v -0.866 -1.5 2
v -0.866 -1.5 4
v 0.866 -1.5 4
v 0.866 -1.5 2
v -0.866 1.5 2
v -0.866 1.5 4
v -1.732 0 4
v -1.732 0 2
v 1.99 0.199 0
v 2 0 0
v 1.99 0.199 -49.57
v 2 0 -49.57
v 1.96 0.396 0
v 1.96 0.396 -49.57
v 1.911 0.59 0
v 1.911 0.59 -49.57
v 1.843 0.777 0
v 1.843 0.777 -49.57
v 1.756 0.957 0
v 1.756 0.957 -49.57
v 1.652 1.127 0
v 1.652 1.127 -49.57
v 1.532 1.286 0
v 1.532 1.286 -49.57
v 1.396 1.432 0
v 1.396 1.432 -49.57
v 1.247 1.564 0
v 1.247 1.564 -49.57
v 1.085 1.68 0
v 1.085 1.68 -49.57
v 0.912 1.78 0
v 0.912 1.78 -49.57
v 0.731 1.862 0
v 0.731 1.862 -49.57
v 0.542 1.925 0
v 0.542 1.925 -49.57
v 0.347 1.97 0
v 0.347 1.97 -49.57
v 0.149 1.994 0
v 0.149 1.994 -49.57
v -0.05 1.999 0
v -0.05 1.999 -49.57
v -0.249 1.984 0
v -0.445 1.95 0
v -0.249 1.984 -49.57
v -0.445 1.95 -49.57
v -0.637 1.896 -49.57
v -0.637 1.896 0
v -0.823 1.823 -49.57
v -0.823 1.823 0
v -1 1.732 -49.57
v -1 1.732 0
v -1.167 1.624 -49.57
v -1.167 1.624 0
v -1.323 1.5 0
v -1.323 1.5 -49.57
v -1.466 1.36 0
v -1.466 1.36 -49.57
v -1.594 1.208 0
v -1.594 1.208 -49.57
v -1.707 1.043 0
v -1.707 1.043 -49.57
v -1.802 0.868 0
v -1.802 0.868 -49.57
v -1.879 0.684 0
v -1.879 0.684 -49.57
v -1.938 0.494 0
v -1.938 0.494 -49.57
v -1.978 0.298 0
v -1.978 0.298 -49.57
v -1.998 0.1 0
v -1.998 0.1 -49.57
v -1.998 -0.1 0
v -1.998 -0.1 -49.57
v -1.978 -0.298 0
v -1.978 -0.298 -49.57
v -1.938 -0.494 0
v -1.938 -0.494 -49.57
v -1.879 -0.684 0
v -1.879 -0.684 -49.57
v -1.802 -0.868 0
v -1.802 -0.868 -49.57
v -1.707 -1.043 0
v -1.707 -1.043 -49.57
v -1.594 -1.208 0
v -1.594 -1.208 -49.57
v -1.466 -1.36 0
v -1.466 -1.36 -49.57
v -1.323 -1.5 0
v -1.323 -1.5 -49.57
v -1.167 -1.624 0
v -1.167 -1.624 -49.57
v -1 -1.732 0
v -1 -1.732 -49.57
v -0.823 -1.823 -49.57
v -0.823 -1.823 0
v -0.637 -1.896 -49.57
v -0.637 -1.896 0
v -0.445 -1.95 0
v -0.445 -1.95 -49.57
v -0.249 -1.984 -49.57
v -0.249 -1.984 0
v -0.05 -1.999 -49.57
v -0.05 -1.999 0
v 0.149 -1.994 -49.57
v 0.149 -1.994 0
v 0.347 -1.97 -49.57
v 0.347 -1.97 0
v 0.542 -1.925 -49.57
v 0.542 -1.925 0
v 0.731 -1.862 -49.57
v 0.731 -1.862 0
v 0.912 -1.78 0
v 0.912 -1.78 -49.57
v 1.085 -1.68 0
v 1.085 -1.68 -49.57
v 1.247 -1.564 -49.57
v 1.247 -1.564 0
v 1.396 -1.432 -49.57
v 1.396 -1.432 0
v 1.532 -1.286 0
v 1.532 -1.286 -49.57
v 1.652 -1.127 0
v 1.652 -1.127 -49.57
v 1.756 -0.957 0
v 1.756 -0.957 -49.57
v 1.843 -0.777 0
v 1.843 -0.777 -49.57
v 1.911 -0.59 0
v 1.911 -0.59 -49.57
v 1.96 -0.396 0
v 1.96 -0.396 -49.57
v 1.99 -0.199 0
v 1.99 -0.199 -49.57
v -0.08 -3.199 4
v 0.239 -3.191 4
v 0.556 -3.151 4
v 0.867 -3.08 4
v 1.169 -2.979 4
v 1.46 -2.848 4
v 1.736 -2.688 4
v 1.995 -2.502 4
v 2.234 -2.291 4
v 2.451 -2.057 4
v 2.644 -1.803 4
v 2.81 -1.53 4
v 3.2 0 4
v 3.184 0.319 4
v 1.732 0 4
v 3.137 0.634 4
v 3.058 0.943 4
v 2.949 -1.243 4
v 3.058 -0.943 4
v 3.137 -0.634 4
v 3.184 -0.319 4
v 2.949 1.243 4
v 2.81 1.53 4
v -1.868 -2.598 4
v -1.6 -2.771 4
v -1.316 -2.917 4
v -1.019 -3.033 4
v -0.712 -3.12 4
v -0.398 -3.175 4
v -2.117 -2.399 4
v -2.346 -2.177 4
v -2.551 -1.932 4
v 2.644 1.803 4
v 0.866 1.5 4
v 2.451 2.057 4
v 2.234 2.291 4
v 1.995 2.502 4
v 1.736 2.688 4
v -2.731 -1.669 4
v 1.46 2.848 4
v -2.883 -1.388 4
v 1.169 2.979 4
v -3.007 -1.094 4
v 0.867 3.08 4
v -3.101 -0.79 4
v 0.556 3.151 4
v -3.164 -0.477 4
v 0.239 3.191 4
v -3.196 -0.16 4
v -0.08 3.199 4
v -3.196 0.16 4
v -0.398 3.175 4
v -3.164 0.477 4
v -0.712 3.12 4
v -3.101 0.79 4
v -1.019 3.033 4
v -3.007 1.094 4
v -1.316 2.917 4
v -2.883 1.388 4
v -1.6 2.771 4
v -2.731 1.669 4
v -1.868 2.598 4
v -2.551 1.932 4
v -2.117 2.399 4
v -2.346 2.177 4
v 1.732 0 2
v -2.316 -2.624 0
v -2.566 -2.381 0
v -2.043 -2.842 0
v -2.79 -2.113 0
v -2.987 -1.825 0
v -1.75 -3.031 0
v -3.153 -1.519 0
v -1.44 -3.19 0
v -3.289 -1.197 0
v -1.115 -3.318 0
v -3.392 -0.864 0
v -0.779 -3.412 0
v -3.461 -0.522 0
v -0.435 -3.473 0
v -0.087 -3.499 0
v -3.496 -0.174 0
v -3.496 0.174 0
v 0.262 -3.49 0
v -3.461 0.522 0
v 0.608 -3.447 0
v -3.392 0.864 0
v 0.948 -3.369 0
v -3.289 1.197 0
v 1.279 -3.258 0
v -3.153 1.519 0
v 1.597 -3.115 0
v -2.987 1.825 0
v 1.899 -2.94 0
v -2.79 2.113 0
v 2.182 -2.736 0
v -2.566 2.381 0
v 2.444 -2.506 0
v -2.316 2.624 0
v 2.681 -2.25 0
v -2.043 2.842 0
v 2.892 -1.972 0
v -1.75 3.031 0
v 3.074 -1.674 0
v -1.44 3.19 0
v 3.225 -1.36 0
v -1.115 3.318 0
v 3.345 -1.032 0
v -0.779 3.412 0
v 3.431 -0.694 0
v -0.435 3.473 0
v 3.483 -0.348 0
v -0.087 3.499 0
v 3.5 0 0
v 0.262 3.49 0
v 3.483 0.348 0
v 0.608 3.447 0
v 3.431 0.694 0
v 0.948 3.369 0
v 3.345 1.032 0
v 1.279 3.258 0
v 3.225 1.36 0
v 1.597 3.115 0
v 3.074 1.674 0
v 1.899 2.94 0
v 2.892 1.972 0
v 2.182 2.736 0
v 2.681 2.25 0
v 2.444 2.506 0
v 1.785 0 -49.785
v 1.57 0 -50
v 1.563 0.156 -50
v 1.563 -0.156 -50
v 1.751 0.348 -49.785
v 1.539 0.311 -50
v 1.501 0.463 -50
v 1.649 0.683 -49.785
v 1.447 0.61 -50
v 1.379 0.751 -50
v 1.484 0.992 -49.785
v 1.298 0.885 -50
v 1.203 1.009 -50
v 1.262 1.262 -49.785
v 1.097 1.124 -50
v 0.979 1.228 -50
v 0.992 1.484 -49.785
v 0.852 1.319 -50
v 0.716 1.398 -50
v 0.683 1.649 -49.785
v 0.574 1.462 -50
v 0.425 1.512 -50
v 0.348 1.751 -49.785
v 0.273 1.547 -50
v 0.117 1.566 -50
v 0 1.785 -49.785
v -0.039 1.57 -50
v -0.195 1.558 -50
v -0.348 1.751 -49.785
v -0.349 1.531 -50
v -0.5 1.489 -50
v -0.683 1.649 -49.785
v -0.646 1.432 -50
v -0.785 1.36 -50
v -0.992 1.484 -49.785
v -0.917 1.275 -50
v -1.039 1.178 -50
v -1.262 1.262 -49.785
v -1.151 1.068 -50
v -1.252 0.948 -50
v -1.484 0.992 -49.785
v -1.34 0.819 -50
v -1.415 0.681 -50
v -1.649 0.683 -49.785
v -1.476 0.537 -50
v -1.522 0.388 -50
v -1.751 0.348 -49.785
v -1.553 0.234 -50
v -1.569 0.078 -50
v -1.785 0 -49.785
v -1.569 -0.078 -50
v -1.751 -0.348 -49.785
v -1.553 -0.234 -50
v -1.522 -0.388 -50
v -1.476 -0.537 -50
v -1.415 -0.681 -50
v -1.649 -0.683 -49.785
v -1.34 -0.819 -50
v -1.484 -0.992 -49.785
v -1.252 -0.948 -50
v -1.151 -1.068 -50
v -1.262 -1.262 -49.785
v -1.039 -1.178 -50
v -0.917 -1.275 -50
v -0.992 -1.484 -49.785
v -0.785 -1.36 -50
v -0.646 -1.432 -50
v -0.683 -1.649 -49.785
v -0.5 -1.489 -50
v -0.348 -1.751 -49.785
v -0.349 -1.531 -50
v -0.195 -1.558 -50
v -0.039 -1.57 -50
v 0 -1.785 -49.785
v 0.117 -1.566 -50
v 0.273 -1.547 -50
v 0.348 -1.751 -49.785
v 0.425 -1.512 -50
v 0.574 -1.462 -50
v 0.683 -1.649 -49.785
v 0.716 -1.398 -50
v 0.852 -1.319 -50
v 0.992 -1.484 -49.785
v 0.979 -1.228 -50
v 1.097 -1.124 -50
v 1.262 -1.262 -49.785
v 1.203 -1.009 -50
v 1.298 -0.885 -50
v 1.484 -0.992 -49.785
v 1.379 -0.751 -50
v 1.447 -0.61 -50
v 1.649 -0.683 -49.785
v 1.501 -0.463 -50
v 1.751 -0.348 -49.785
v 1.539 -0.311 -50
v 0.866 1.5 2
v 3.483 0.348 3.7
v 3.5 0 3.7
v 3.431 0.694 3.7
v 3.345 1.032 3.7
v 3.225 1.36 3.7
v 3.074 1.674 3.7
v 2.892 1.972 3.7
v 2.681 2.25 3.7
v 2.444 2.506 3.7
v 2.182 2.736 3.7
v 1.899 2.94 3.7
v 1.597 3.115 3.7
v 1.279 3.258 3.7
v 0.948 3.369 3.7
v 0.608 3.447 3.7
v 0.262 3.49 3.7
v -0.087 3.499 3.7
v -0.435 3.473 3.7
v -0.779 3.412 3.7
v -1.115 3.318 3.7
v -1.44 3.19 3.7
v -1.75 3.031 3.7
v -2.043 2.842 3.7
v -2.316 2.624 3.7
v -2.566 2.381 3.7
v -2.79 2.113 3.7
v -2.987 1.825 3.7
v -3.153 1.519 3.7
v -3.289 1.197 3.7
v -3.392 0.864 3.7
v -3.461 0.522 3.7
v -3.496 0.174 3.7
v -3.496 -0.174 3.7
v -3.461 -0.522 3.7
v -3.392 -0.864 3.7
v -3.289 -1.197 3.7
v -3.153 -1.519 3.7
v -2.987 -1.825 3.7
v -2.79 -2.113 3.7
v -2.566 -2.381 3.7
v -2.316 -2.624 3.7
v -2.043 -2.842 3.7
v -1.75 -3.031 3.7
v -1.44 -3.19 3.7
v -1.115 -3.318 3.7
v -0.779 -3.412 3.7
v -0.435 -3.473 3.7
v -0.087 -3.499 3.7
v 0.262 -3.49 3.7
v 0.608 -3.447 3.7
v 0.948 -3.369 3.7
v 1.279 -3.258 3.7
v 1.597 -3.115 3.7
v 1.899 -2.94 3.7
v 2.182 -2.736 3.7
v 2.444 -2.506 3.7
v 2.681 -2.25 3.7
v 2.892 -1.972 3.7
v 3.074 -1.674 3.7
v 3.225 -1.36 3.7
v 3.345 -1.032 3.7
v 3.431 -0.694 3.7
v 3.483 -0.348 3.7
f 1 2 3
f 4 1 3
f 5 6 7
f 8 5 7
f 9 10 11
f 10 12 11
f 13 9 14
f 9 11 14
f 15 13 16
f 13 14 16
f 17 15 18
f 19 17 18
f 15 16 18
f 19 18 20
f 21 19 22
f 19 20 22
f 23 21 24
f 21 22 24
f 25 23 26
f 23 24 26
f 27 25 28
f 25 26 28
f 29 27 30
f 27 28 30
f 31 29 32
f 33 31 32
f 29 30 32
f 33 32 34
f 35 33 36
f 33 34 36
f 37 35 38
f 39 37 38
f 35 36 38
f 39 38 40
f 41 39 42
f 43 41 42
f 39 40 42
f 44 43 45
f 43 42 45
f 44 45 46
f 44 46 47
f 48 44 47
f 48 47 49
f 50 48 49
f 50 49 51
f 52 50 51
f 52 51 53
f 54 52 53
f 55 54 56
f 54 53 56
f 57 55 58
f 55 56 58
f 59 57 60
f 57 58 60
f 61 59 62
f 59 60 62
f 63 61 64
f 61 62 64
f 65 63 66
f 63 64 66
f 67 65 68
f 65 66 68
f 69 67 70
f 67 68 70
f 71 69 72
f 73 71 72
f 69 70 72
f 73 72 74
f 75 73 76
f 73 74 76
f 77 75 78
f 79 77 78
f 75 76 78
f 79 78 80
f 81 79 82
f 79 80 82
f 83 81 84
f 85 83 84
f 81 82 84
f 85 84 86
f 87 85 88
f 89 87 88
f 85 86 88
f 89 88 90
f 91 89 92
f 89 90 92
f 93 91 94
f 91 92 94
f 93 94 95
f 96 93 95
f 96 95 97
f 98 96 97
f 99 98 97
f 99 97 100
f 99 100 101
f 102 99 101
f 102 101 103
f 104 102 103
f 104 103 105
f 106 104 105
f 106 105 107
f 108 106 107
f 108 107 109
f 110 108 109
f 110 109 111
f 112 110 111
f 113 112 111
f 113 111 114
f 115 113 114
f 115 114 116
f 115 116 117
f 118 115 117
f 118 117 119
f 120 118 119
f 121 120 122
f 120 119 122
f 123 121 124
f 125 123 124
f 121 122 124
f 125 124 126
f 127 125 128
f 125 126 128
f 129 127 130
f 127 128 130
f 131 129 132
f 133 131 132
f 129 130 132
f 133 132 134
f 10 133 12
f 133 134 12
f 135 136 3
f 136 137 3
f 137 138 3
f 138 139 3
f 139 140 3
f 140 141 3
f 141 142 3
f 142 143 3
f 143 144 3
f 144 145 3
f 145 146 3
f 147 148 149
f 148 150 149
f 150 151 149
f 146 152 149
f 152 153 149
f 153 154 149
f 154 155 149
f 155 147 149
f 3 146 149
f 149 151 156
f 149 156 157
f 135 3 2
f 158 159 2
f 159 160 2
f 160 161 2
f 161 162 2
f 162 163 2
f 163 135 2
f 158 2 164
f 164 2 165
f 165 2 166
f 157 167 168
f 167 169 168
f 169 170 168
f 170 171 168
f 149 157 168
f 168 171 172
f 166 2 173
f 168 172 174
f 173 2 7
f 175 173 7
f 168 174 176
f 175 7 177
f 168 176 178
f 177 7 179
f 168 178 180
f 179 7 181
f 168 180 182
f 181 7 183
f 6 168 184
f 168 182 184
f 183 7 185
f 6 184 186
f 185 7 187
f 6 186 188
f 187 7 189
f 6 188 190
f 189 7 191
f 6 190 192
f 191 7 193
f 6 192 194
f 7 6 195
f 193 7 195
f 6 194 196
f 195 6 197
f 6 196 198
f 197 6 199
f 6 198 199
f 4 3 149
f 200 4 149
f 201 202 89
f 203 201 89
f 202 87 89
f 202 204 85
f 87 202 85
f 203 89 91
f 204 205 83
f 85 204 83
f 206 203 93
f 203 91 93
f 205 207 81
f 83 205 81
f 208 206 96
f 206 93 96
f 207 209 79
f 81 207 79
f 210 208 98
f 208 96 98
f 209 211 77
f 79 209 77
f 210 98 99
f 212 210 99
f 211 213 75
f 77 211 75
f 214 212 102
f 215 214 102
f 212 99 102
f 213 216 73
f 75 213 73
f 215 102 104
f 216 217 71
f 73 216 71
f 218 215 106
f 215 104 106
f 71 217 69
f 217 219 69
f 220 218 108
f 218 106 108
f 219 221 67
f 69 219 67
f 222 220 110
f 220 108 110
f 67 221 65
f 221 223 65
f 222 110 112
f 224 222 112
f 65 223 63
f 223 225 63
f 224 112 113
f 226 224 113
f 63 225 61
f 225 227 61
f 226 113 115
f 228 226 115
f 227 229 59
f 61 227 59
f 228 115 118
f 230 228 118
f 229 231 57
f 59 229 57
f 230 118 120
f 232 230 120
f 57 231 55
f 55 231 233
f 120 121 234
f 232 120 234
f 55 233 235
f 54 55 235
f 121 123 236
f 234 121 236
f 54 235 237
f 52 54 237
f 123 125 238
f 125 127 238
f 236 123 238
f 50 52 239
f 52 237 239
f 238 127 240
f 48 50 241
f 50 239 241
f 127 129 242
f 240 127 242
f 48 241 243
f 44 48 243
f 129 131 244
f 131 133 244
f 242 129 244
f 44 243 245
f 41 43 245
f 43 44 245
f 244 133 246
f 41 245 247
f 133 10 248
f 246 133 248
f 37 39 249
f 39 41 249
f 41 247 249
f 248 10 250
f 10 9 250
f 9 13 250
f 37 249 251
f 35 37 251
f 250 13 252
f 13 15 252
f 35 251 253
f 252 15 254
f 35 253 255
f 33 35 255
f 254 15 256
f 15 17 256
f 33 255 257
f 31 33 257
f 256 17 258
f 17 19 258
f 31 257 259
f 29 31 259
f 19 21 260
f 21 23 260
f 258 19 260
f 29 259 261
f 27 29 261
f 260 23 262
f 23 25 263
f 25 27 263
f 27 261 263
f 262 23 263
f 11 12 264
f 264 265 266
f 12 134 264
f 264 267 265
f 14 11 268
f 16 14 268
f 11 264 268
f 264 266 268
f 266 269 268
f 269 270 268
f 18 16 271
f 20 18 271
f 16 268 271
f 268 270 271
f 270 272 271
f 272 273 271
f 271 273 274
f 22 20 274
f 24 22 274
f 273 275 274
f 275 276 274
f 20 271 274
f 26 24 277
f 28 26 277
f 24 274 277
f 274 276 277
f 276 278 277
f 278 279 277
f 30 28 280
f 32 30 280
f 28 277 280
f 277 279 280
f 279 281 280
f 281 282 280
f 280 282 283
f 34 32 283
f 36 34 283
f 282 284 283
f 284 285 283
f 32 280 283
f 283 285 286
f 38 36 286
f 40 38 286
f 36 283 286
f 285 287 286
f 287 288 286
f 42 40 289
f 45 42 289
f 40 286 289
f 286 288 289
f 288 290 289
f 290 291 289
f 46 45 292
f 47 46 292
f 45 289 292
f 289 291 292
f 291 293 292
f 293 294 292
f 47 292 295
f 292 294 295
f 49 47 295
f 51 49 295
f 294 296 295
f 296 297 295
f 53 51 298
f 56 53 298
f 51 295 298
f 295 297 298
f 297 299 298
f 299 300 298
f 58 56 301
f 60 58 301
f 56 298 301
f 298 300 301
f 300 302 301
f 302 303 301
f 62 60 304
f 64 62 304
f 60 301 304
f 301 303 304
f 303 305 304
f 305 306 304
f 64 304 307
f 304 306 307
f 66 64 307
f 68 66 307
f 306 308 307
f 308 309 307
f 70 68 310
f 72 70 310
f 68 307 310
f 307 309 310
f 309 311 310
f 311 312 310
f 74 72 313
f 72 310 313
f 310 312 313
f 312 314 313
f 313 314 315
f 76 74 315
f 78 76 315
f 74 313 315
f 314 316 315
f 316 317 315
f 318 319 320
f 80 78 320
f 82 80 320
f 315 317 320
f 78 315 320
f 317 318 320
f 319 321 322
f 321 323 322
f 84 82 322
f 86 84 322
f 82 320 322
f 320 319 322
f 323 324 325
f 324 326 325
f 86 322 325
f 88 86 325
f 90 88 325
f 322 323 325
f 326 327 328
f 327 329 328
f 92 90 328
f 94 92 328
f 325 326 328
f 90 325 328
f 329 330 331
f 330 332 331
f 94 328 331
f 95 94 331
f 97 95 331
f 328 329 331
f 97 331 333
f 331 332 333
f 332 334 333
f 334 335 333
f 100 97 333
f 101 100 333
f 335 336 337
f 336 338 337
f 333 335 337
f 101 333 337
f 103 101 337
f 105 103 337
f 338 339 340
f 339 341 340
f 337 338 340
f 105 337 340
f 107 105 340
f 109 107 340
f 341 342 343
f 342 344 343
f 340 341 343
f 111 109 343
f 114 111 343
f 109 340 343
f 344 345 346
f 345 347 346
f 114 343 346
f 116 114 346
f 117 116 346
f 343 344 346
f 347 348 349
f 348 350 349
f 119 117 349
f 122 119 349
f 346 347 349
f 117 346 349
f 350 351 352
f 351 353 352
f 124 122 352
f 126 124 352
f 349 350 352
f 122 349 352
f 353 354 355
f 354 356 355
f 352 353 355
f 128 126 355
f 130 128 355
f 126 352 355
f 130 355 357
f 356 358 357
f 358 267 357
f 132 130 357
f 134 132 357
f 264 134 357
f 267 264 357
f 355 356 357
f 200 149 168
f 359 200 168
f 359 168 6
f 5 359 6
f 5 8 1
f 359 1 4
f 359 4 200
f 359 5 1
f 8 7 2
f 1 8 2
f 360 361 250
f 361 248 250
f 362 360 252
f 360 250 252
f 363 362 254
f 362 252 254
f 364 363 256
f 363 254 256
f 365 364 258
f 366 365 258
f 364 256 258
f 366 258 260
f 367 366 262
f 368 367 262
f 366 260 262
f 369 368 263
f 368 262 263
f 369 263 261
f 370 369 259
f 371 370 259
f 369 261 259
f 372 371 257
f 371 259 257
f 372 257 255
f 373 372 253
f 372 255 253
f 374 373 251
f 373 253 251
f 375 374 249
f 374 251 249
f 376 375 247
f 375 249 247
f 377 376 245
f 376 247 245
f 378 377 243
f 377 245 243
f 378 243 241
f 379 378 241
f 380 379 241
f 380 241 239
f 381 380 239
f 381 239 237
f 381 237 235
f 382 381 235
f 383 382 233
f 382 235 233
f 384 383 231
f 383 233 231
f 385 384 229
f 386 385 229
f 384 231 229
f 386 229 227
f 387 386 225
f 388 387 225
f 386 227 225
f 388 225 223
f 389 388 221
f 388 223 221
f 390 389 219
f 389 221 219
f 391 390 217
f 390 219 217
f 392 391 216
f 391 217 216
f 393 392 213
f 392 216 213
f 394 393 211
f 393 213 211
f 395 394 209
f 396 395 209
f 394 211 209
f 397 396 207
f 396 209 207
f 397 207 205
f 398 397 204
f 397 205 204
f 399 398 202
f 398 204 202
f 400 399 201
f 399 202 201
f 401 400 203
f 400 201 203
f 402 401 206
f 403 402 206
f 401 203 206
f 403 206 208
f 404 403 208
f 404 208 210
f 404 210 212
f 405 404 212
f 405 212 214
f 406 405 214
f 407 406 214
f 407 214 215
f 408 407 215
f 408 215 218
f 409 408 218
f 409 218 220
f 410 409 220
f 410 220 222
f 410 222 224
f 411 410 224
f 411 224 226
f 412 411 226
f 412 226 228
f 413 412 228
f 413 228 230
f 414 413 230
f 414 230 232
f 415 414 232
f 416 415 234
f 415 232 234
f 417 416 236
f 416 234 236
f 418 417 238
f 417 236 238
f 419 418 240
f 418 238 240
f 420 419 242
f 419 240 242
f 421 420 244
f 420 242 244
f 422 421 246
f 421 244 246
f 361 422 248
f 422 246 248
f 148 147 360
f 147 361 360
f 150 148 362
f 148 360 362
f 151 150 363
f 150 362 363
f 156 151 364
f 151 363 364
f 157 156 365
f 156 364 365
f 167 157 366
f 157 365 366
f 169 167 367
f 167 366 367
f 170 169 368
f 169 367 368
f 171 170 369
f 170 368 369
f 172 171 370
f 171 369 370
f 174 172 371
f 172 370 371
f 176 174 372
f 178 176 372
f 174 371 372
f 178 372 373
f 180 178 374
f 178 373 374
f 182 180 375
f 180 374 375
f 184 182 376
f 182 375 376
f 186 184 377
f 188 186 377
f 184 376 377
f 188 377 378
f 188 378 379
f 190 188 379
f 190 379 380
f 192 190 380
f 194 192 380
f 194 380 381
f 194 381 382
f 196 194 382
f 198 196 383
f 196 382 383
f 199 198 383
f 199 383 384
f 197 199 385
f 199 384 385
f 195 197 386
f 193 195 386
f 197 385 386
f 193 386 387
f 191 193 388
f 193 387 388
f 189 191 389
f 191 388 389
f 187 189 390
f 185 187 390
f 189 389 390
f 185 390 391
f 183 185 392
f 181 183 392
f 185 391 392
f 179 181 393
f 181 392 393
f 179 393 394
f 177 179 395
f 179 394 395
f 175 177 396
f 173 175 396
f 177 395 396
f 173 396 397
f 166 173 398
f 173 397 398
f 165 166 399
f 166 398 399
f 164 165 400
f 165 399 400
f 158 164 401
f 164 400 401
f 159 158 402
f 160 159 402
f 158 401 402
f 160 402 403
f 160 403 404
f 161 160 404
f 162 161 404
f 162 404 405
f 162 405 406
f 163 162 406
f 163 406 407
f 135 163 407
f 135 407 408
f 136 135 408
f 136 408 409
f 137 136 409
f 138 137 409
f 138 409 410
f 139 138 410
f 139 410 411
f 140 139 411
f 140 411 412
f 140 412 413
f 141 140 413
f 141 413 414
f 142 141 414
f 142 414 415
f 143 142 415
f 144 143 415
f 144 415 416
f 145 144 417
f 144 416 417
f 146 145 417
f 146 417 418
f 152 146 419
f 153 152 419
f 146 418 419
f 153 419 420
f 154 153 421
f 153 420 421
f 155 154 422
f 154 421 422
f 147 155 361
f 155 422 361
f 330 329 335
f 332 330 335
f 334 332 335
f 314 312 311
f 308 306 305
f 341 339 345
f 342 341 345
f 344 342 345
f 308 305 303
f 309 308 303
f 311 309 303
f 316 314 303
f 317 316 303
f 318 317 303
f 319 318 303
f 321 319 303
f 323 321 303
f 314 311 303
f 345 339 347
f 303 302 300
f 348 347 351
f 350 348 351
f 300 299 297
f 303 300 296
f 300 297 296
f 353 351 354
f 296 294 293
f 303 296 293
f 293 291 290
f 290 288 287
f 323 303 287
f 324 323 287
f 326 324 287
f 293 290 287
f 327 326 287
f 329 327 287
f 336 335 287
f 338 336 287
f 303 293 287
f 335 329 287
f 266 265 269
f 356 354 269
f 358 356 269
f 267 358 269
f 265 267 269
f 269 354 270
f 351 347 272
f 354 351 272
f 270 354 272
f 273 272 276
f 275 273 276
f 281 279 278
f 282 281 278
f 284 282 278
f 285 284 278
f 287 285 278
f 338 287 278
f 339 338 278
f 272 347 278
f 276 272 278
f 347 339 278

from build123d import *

# Parameters (mm, degrees)
CUT_EXTRUDE_1_DEPTH = 2


with BuildPart() as part:
    # 草图1 → 旋转1 (revolve)
    with BuildSketch(Plane(origin=(0, 0, 0), x_dir=(0, 0, -1), z_dir=(1, 0, 0))):
        Polygon((-4, 0), (-4, 3.2), (-3.7, 3.5), (0, 3.5), (0, 2), (49.5705, 2), (50, 1.5705), (50, 0), align=None)
    revolve(axis=Axis((0, 0, -50), (0, 0, 1)))

    # 草图2 → 切除-拉伸1 (cut)
    with BuildSketch(Plane.XY.offset(4)):
        Polygon((-0.866025404, -1.5), (0.866025404, -1.5), (1.732050808, 0), (0.866025404, 1.5), (-0.866025404, 1.5), (-1.732050808, 0), align=None)
    extrude(amount=-CUT_EXTRUDE_1_DEPTH, mode=Mode.SUBTRACT)


solid = part.part
